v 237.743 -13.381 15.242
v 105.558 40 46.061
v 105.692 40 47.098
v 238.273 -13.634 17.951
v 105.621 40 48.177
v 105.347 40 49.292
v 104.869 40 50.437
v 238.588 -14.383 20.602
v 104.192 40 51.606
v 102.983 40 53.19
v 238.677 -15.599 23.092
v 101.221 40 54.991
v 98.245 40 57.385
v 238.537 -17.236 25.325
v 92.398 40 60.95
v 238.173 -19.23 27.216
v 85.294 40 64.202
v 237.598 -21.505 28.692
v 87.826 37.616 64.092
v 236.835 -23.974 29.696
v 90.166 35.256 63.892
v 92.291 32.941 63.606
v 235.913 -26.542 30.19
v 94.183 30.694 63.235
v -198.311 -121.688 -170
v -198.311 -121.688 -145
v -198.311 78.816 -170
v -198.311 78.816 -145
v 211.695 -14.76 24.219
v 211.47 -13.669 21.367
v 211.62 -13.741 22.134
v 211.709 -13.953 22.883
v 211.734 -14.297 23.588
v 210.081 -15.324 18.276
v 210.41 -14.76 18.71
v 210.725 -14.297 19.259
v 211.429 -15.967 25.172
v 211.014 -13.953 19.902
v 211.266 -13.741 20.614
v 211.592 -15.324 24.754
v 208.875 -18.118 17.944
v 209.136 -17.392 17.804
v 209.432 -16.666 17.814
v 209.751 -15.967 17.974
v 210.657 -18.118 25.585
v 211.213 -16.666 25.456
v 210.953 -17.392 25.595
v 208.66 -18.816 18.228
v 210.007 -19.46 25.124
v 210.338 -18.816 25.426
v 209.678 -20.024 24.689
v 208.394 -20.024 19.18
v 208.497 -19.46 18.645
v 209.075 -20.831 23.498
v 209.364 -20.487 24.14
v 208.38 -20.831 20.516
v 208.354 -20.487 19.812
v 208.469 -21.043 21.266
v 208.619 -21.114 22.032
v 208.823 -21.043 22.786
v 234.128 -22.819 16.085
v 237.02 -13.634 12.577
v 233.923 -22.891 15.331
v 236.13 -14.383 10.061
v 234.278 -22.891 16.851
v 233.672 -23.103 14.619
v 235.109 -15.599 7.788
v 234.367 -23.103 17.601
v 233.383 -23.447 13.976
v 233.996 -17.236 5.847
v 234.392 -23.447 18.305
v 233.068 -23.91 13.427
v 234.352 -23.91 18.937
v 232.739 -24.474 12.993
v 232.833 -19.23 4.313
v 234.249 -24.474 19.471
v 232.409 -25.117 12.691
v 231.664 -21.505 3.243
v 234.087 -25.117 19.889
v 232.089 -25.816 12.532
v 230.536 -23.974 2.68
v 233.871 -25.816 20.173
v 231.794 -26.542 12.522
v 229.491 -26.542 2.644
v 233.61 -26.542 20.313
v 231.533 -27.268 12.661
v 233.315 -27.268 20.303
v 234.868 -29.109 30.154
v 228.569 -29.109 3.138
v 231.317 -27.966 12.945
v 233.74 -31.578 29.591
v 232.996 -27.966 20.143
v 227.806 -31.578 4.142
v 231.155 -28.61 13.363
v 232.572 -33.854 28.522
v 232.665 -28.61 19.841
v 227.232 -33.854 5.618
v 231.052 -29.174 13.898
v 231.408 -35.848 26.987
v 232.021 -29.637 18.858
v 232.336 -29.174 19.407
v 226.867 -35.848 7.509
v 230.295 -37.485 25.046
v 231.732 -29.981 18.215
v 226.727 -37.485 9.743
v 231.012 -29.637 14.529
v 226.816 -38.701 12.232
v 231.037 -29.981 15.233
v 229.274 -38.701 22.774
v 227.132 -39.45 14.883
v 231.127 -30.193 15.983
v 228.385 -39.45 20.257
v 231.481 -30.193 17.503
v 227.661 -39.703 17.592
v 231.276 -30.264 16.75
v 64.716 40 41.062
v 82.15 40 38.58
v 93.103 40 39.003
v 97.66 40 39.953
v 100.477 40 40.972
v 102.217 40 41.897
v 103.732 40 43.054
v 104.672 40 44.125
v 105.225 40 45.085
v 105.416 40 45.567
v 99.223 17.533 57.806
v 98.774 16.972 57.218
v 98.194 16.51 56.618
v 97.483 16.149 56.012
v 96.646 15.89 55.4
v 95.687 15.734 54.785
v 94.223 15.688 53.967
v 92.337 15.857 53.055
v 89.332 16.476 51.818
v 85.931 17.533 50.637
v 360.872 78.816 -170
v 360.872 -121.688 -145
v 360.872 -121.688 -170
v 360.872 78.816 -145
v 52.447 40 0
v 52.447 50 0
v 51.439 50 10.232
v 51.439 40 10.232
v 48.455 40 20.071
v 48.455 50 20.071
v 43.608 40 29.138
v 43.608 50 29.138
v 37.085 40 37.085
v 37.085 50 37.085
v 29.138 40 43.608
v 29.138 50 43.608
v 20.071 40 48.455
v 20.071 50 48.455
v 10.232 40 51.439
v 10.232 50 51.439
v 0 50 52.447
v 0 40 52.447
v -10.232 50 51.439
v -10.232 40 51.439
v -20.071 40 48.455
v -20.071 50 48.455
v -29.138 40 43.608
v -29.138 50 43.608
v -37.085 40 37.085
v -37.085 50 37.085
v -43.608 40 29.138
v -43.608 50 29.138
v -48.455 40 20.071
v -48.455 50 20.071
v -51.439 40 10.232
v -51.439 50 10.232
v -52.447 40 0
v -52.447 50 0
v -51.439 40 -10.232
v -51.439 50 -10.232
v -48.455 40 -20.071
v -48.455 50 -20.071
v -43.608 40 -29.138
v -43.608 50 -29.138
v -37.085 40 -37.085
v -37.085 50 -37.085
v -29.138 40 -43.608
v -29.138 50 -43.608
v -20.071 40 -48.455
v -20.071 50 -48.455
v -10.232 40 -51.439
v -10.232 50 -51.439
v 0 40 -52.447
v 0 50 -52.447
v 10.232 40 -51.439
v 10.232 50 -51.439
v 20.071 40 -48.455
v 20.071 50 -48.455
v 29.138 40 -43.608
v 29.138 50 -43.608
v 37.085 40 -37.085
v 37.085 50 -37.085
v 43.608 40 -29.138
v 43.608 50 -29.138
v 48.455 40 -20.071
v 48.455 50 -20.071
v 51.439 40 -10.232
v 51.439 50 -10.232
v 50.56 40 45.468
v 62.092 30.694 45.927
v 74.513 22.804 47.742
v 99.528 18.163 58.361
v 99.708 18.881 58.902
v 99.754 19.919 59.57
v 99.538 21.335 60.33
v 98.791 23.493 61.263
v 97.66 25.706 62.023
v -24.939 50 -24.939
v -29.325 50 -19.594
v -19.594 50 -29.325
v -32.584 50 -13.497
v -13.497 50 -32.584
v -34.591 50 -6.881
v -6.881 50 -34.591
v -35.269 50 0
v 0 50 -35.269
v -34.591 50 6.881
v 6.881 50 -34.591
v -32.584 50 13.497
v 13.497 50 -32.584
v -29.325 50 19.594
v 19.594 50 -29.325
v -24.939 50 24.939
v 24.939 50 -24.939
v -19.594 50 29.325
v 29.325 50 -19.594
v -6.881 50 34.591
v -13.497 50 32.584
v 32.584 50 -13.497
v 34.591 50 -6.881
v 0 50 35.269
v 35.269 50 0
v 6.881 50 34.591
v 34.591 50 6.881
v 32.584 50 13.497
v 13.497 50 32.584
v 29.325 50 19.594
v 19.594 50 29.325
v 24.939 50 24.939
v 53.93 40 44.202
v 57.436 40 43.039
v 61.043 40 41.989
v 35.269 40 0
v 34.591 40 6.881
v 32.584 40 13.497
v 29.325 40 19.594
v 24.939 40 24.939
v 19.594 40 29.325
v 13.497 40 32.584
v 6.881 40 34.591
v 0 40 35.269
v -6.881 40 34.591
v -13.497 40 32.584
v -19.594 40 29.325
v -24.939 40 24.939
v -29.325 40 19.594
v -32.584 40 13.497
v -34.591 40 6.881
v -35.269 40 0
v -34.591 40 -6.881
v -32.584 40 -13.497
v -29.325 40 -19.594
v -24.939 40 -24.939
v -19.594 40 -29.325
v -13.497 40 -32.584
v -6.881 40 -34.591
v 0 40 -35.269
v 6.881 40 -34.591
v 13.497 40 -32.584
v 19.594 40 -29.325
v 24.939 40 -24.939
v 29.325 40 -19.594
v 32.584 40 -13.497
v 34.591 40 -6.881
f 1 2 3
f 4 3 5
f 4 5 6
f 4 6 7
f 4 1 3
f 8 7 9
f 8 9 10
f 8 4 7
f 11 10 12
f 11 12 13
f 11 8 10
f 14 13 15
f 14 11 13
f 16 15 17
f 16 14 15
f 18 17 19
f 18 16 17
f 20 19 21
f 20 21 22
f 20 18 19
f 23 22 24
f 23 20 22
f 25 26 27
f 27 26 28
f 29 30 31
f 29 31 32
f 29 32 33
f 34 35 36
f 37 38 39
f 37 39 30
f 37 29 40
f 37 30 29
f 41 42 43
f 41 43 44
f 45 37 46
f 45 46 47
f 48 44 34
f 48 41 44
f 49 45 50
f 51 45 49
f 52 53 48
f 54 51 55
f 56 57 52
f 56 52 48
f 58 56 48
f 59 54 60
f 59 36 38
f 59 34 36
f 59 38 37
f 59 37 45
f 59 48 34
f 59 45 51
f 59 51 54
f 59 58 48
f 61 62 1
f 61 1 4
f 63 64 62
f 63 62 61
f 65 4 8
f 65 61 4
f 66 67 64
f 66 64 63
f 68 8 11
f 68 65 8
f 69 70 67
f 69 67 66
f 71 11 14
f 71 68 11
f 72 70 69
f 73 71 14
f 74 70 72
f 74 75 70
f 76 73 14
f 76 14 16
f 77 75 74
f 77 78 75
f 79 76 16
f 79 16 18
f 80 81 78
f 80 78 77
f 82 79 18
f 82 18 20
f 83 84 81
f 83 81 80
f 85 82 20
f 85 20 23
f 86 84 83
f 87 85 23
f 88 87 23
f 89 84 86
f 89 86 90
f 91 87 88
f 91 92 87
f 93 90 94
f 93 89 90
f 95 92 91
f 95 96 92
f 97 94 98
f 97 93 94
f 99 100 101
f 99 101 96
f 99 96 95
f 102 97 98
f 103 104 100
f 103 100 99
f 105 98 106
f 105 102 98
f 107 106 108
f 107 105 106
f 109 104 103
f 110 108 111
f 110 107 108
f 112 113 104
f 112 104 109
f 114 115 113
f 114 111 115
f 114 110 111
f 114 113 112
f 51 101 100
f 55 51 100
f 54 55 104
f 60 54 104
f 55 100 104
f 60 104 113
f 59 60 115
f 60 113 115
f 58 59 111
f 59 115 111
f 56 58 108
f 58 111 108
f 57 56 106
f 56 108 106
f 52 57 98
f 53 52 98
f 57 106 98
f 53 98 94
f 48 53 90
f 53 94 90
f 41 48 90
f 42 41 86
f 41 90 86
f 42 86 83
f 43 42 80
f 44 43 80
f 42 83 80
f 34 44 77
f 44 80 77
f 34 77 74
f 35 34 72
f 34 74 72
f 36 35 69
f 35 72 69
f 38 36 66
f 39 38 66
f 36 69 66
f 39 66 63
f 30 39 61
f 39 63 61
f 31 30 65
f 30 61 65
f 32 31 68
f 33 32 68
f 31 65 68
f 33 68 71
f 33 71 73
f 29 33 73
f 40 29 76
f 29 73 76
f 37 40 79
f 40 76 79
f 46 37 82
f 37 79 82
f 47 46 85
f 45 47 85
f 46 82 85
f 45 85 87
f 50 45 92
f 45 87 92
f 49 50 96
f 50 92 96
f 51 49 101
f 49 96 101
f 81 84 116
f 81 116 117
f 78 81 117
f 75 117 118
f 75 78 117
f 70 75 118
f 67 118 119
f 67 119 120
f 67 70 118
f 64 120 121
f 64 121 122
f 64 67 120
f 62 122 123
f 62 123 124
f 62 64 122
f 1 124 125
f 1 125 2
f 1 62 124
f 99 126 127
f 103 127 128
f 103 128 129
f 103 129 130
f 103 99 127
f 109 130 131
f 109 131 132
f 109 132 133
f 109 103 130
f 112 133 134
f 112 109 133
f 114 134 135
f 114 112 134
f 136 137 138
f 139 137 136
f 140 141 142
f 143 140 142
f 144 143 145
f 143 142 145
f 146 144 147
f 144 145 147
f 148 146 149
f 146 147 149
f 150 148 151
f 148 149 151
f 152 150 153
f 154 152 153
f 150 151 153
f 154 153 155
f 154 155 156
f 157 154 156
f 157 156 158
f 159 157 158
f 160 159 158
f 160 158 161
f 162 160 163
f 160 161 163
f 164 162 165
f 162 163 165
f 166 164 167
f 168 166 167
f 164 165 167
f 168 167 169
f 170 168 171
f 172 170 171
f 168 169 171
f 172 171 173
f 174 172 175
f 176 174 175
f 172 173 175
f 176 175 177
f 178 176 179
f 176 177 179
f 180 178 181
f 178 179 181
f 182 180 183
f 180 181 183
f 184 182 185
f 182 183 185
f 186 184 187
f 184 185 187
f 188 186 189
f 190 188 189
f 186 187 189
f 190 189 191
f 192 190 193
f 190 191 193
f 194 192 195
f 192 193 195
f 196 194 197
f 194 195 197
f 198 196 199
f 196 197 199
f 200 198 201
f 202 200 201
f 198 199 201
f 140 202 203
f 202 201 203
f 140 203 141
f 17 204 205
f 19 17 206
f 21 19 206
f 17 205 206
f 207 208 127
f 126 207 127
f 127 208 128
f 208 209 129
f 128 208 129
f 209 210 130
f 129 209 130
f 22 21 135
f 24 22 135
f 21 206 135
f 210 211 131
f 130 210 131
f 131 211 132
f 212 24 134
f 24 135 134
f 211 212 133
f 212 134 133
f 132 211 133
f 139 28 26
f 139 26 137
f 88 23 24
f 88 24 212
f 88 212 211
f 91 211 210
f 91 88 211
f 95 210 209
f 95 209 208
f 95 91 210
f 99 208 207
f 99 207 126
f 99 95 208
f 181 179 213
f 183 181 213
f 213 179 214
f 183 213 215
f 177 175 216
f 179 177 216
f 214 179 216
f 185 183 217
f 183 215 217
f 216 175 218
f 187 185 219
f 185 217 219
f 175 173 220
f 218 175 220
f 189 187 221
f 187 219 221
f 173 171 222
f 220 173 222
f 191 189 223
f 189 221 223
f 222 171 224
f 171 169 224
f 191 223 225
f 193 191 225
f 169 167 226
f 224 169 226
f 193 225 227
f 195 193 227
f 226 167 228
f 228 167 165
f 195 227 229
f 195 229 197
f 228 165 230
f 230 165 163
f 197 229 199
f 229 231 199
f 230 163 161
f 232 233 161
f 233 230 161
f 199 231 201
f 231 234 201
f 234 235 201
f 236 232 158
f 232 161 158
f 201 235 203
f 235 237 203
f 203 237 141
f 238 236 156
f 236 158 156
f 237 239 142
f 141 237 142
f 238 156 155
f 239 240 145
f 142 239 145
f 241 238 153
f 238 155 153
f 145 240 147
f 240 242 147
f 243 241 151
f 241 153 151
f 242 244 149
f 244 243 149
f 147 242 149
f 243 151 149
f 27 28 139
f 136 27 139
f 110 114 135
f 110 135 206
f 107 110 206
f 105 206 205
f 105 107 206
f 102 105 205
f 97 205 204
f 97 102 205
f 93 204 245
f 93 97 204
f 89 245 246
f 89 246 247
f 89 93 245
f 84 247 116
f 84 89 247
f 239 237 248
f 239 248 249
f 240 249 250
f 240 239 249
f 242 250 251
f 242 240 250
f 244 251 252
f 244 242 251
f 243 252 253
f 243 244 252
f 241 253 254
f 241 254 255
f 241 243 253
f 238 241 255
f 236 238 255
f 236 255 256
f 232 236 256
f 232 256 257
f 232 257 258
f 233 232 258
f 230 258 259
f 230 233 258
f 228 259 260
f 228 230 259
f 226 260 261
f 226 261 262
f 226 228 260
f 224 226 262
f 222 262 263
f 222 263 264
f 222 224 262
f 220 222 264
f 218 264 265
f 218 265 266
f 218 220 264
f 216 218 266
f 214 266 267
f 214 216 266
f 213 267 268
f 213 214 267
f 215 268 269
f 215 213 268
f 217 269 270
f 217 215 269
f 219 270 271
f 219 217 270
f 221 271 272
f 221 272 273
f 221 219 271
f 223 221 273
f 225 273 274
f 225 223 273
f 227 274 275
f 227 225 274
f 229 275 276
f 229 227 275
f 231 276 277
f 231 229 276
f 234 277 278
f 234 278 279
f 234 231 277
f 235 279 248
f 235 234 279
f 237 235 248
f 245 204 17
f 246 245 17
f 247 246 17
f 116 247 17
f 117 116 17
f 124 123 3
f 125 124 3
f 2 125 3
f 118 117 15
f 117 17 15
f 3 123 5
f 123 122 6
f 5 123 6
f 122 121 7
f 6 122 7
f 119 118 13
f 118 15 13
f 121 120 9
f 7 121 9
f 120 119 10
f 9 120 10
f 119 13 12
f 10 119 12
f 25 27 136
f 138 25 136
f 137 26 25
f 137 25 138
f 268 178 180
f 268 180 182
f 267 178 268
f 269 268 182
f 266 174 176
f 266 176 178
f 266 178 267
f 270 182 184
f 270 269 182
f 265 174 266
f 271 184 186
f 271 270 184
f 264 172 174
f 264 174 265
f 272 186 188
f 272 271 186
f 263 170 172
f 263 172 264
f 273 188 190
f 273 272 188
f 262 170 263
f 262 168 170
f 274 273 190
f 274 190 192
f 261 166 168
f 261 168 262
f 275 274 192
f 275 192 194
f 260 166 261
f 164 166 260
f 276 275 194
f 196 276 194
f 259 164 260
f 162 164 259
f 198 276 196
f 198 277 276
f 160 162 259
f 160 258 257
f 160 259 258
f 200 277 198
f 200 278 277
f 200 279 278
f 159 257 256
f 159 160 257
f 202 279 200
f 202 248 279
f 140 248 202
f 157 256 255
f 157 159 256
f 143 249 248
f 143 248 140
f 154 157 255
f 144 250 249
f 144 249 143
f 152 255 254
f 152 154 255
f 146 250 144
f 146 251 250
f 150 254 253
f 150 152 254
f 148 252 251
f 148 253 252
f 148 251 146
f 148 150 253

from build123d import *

# Parameters (mm, degrees)
F2_R      = 52.4468032927
F2_R_2    = 35.2687757181
F3_DEPTH  = 10
F9_W      = 20
F9_H      = 20
F9_R      = 4
F10_DEPTH = 2000
F11_DEPTH = 25
F13_W     = 559.1834336519
F13_H     = 200.5045488477
F14_DEPTH = 25
F16_W     = 3887.4027729034
F16_H     = 3285.4166030884
F18_DEPTH = 678.6163205323
F19_ANGLE = -225
F21_W     = 3887.4027729034
F21_H     = 3285.4166030884
F22_DEPTH = 38.8173766265


with BuildPart() as f3:
    # F2 (on offset) → F3 (new body)
    with BuildSketch(Plane.XZ.offset(-50)):
        Circle(F2_R)
        Circle(F2_R_2, mode=Mode.SUBTRACT)
    extrude(amount=F3_DEPTH)


with BuildPart() as f10:
    # F9 (on face) → F10 (new body)
    with BuildSketch(Plane(origin=(196.8001302702, -79.4746385064, -45.8847039354), x_dir=(0.3564382351, 0.9306155778, -0.0831049393), z_dir=(0.906307787, -0.3659981508, -0.2113091309))):
        with Locations((56.8793033835, 68.8264967326)):
            Rectangle(F9_W, F9_H)
        with Locations((56.8793033835, 68.8264967326)):
            Circle(F9_R, mode=Mode.SUBTRACT)
        with Locations((56.8793033835, 68.8264967326)):
            Circle(F9_R)
        with BuildLine():
            Line((46.8793033835, 58.8264967326), (46.8793033835, 78.8264967326))
            ThreePointArc((46.8793033835, 78.8264967326), (42.7371677598, 68.8264967326), (46.8793033835, 58.8264967326))
        make_face()
        with BuildLine():
            Line((46.8793033835, 78.8264967326), (66.8793033835, 78.8264967326))
            ThreePointArc((66.8793033835, 78.8264967326), (56.8793033835, 82.9686323564), (46.8793033835, 78.8264967326))
        make_face()
        with BuildLine():
            ThreePointArc((71.0214390072, 68.8264967326), (69.9449330323, 74.2384577341), (66.8793033835, 78.8264967326))
            Line((66.8793033835, 78.8264967326), (66.8793033835, 58.8264967326))
            ThreePointArc((66.8793033835, 58.8264967326), (69.9449330323, 63.4145357312), (71.0214390072, 68.8264967326))
        make_face()
        with BuildLine():
            ThreePointArc((46.8793033835, 58.8264967326), (56.8793033835, 54.6843611089), (66.8793033835, 58.8264967326))
            Line((66.8793033835, 58.8264967326), (46.8793033835, 58.8264967326))
        make_face()
    extrude(amount=-F10_DEPTH)

    # F9 (on face) → F11 (cut)
    with BuildSketch(Plane(origin=(196.8001302702, -79.4746385064, -45.8847039354), x_dir=(0.3564382351, 0.9306155778, -0.0831049393), z_dir=(0.906307787, -0.3659981508, -0.2113091309))):
        with Locations((56.8793033835, 68.8264967326)):
            Circle(F9_R)
    extrude(amount=-F11_DEPTH, mode=Mode.SUBTRACT)


with BuildPart() as f14:
    # F13 (on offset) → F14 (new body)
    with BuildSketch(Plane.XY.offset(-145)):
        with Locations((81.2806412578, -21.4358977973)):
            Rectangle(F13_W, F13_H)
    extrude(amount=-F14_DEPTH)


with BuildPart() as f10_1:
    # F17: moved
    add(f10.part)

    # F16 (on offset) → F18 (cut, through all)
    with BuildSketch(Plane.XZ.offset(-40)):
        with Locations((-28.5538434982, 86.0296487808)):
            Rectangle(F16_W, F16_H)
    extrude(amount=-F18_DEPTH, mode=Mode.SUBTRACT)


with BuildPart() as f10_2:
    # F19: moved
    add(f10_1.part.rotate(Axis((232.7020962549, -26.5418727237, 16.4170853719), (0.906307787, -0.3659981508, -0.2113091309)), F19_ANGLE))

    # F21 (on offset) → F22 (cut, through all)
    with BuildSketch(Plane.XZ.offset(-40)):
        with Locations((-28.5538434982, 86.0296487808)):
            Rectangle(F21_W, F21_H)
    extrude(amount=-F22_DEPTH, mode=Mode.SUBTRACT)


solid = Compound([f3.part, f14.part, f10_2.part])
